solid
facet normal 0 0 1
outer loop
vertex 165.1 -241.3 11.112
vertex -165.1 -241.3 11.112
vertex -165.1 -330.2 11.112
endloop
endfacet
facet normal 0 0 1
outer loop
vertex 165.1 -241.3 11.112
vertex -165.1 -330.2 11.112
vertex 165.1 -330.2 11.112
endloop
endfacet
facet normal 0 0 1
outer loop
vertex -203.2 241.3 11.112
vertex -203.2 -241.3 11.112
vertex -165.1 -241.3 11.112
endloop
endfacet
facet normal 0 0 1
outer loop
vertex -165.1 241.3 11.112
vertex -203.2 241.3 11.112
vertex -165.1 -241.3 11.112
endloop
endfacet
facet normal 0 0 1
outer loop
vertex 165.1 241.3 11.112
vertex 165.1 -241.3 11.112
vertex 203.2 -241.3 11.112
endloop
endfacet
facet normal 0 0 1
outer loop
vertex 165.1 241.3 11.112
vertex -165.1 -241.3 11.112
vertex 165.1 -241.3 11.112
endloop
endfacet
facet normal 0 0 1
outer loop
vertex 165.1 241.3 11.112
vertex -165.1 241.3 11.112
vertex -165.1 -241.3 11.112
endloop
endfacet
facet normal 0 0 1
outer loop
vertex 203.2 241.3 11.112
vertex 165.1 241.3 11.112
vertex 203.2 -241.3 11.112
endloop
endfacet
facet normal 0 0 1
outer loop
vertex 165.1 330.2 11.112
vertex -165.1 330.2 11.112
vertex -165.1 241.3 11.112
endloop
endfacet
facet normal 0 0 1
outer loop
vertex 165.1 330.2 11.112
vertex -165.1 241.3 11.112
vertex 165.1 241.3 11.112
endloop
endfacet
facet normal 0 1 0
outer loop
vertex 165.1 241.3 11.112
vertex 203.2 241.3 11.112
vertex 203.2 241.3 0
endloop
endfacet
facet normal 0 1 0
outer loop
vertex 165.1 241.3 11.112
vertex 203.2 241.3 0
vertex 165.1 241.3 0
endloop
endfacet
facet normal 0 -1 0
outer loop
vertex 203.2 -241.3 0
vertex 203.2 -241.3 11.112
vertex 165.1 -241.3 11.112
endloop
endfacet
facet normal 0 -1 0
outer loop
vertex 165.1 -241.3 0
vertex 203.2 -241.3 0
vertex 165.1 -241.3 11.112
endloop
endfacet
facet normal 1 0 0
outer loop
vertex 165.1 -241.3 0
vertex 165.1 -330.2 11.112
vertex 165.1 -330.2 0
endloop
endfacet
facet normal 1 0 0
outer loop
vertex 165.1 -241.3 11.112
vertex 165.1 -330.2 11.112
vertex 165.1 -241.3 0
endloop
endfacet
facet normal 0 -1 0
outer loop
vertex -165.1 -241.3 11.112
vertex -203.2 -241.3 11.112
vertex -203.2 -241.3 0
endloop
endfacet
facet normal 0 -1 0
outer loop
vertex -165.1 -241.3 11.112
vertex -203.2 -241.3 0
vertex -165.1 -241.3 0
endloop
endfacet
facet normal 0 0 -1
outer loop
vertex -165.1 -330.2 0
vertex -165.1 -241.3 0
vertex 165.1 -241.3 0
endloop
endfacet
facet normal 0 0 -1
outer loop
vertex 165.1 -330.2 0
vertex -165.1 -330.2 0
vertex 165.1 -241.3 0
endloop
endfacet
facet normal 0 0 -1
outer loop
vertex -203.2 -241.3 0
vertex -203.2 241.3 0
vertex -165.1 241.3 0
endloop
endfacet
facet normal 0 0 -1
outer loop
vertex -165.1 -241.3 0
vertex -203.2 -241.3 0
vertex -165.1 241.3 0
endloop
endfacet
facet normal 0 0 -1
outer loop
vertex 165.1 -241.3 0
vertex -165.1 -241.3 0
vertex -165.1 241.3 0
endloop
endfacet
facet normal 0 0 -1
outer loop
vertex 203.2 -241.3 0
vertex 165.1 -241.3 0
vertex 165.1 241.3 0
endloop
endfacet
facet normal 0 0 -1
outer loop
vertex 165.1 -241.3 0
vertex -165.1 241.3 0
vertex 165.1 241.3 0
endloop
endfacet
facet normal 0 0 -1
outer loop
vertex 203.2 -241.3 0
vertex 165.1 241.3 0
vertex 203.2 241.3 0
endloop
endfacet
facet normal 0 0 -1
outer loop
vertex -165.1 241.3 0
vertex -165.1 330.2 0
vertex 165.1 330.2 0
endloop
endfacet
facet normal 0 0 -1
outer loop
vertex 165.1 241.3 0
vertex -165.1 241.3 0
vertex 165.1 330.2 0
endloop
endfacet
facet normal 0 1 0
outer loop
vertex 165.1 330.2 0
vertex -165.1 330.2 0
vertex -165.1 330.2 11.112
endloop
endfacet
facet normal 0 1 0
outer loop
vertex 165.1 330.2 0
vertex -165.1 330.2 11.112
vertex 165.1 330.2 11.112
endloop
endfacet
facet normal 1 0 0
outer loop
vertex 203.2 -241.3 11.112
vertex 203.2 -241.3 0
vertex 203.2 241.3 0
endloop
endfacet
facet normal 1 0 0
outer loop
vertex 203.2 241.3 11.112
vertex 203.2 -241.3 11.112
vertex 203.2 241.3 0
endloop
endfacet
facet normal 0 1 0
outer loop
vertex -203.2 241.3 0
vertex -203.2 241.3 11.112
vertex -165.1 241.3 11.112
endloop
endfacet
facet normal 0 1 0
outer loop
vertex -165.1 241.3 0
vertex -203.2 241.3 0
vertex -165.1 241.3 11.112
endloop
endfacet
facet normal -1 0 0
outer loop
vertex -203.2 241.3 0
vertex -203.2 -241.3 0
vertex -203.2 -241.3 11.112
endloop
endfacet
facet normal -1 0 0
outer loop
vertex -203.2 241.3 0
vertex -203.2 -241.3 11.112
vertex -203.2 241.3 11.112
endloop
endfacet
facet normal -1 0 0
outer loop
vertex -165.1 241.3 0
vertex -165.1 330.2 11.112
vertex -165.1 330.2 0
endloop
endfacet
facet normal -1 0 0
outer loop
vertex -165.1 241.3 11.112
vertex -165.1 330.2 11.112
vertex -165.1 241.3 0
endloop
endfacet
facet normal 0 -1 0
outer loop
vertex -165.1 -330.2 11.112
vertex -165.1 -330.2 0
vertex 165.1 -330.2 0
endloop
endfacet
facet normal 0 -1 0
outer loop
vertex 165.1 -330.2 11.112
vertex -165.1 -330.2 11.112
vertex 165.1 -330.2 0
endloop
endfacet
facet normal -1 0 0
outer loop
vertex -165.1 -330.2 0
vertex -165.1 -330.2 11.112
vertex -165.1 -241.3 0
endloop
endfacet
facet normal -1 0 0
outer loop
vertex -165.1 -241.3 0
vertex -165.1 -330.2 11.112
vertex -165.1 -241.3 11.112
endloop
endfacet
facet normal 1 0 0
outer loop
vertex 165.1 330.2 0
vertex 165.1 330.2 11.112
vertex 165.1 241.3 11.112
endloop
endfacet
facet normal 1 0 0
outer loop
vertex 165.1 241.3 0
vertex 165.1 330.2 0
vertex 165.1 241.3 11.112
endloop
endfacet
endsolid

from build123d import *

# Parameters (mm, degrees)
F0_W             = 406.4
F0_H             = 660.4
F1_DEPTH         = 11.1125
F2_W             = 38.1
F2_H             = 88.9
F3_DEPTH         = 25.4
F3_COPIES2_COUNT = 2


# Not quite as in the source:
# - a pattern or mirror of a feature is missing from the dataset's text; its kind, count and spacing are read off the source's solid


with BuildPart() as f1:
    # F0 (on Top) → F1 (new body)
    with BuildSketch(Plane.XY):
        Rectangle(F0_W, F0_H)
    extrude(amount=F1_DEPTH)

    # F2 (on face) → F3 (cut)
    with BuildSketch(Plane.XY.offset(11.1125)):
        with Locations((-184.15, -285.75)):
            Rectangle(F2_W, F2_H)
    f3 = extrude(amount=-F3_DEPTH, mode=Mode.SUBTRACT)

    # F3_copies: F3 across plane
    add(f3.mirror(Plane(origin=(0, 0, 0), x_dir=(0, 0, 1), z_dir=(1, 0, 0))), mode=Mode.SUBTRACT)

    # F3_copies1: F3 across plane
    add(f3.mirror(Plane.ZX), mode=Mode.SUBTRACT)

    # F3_copies2: F3 ×2 about axis
    f3_copies2_axis = Axis((0, 0, 0), (0, 0, 1))
    for i in range(1, F3_COPIES2_COUNT):
        add(f3.rotate(f3_copies2_axis, i * 360 / F3_COPIES2_COUNT), mode=Mode.SUBTRACT)


solid = f1.part
